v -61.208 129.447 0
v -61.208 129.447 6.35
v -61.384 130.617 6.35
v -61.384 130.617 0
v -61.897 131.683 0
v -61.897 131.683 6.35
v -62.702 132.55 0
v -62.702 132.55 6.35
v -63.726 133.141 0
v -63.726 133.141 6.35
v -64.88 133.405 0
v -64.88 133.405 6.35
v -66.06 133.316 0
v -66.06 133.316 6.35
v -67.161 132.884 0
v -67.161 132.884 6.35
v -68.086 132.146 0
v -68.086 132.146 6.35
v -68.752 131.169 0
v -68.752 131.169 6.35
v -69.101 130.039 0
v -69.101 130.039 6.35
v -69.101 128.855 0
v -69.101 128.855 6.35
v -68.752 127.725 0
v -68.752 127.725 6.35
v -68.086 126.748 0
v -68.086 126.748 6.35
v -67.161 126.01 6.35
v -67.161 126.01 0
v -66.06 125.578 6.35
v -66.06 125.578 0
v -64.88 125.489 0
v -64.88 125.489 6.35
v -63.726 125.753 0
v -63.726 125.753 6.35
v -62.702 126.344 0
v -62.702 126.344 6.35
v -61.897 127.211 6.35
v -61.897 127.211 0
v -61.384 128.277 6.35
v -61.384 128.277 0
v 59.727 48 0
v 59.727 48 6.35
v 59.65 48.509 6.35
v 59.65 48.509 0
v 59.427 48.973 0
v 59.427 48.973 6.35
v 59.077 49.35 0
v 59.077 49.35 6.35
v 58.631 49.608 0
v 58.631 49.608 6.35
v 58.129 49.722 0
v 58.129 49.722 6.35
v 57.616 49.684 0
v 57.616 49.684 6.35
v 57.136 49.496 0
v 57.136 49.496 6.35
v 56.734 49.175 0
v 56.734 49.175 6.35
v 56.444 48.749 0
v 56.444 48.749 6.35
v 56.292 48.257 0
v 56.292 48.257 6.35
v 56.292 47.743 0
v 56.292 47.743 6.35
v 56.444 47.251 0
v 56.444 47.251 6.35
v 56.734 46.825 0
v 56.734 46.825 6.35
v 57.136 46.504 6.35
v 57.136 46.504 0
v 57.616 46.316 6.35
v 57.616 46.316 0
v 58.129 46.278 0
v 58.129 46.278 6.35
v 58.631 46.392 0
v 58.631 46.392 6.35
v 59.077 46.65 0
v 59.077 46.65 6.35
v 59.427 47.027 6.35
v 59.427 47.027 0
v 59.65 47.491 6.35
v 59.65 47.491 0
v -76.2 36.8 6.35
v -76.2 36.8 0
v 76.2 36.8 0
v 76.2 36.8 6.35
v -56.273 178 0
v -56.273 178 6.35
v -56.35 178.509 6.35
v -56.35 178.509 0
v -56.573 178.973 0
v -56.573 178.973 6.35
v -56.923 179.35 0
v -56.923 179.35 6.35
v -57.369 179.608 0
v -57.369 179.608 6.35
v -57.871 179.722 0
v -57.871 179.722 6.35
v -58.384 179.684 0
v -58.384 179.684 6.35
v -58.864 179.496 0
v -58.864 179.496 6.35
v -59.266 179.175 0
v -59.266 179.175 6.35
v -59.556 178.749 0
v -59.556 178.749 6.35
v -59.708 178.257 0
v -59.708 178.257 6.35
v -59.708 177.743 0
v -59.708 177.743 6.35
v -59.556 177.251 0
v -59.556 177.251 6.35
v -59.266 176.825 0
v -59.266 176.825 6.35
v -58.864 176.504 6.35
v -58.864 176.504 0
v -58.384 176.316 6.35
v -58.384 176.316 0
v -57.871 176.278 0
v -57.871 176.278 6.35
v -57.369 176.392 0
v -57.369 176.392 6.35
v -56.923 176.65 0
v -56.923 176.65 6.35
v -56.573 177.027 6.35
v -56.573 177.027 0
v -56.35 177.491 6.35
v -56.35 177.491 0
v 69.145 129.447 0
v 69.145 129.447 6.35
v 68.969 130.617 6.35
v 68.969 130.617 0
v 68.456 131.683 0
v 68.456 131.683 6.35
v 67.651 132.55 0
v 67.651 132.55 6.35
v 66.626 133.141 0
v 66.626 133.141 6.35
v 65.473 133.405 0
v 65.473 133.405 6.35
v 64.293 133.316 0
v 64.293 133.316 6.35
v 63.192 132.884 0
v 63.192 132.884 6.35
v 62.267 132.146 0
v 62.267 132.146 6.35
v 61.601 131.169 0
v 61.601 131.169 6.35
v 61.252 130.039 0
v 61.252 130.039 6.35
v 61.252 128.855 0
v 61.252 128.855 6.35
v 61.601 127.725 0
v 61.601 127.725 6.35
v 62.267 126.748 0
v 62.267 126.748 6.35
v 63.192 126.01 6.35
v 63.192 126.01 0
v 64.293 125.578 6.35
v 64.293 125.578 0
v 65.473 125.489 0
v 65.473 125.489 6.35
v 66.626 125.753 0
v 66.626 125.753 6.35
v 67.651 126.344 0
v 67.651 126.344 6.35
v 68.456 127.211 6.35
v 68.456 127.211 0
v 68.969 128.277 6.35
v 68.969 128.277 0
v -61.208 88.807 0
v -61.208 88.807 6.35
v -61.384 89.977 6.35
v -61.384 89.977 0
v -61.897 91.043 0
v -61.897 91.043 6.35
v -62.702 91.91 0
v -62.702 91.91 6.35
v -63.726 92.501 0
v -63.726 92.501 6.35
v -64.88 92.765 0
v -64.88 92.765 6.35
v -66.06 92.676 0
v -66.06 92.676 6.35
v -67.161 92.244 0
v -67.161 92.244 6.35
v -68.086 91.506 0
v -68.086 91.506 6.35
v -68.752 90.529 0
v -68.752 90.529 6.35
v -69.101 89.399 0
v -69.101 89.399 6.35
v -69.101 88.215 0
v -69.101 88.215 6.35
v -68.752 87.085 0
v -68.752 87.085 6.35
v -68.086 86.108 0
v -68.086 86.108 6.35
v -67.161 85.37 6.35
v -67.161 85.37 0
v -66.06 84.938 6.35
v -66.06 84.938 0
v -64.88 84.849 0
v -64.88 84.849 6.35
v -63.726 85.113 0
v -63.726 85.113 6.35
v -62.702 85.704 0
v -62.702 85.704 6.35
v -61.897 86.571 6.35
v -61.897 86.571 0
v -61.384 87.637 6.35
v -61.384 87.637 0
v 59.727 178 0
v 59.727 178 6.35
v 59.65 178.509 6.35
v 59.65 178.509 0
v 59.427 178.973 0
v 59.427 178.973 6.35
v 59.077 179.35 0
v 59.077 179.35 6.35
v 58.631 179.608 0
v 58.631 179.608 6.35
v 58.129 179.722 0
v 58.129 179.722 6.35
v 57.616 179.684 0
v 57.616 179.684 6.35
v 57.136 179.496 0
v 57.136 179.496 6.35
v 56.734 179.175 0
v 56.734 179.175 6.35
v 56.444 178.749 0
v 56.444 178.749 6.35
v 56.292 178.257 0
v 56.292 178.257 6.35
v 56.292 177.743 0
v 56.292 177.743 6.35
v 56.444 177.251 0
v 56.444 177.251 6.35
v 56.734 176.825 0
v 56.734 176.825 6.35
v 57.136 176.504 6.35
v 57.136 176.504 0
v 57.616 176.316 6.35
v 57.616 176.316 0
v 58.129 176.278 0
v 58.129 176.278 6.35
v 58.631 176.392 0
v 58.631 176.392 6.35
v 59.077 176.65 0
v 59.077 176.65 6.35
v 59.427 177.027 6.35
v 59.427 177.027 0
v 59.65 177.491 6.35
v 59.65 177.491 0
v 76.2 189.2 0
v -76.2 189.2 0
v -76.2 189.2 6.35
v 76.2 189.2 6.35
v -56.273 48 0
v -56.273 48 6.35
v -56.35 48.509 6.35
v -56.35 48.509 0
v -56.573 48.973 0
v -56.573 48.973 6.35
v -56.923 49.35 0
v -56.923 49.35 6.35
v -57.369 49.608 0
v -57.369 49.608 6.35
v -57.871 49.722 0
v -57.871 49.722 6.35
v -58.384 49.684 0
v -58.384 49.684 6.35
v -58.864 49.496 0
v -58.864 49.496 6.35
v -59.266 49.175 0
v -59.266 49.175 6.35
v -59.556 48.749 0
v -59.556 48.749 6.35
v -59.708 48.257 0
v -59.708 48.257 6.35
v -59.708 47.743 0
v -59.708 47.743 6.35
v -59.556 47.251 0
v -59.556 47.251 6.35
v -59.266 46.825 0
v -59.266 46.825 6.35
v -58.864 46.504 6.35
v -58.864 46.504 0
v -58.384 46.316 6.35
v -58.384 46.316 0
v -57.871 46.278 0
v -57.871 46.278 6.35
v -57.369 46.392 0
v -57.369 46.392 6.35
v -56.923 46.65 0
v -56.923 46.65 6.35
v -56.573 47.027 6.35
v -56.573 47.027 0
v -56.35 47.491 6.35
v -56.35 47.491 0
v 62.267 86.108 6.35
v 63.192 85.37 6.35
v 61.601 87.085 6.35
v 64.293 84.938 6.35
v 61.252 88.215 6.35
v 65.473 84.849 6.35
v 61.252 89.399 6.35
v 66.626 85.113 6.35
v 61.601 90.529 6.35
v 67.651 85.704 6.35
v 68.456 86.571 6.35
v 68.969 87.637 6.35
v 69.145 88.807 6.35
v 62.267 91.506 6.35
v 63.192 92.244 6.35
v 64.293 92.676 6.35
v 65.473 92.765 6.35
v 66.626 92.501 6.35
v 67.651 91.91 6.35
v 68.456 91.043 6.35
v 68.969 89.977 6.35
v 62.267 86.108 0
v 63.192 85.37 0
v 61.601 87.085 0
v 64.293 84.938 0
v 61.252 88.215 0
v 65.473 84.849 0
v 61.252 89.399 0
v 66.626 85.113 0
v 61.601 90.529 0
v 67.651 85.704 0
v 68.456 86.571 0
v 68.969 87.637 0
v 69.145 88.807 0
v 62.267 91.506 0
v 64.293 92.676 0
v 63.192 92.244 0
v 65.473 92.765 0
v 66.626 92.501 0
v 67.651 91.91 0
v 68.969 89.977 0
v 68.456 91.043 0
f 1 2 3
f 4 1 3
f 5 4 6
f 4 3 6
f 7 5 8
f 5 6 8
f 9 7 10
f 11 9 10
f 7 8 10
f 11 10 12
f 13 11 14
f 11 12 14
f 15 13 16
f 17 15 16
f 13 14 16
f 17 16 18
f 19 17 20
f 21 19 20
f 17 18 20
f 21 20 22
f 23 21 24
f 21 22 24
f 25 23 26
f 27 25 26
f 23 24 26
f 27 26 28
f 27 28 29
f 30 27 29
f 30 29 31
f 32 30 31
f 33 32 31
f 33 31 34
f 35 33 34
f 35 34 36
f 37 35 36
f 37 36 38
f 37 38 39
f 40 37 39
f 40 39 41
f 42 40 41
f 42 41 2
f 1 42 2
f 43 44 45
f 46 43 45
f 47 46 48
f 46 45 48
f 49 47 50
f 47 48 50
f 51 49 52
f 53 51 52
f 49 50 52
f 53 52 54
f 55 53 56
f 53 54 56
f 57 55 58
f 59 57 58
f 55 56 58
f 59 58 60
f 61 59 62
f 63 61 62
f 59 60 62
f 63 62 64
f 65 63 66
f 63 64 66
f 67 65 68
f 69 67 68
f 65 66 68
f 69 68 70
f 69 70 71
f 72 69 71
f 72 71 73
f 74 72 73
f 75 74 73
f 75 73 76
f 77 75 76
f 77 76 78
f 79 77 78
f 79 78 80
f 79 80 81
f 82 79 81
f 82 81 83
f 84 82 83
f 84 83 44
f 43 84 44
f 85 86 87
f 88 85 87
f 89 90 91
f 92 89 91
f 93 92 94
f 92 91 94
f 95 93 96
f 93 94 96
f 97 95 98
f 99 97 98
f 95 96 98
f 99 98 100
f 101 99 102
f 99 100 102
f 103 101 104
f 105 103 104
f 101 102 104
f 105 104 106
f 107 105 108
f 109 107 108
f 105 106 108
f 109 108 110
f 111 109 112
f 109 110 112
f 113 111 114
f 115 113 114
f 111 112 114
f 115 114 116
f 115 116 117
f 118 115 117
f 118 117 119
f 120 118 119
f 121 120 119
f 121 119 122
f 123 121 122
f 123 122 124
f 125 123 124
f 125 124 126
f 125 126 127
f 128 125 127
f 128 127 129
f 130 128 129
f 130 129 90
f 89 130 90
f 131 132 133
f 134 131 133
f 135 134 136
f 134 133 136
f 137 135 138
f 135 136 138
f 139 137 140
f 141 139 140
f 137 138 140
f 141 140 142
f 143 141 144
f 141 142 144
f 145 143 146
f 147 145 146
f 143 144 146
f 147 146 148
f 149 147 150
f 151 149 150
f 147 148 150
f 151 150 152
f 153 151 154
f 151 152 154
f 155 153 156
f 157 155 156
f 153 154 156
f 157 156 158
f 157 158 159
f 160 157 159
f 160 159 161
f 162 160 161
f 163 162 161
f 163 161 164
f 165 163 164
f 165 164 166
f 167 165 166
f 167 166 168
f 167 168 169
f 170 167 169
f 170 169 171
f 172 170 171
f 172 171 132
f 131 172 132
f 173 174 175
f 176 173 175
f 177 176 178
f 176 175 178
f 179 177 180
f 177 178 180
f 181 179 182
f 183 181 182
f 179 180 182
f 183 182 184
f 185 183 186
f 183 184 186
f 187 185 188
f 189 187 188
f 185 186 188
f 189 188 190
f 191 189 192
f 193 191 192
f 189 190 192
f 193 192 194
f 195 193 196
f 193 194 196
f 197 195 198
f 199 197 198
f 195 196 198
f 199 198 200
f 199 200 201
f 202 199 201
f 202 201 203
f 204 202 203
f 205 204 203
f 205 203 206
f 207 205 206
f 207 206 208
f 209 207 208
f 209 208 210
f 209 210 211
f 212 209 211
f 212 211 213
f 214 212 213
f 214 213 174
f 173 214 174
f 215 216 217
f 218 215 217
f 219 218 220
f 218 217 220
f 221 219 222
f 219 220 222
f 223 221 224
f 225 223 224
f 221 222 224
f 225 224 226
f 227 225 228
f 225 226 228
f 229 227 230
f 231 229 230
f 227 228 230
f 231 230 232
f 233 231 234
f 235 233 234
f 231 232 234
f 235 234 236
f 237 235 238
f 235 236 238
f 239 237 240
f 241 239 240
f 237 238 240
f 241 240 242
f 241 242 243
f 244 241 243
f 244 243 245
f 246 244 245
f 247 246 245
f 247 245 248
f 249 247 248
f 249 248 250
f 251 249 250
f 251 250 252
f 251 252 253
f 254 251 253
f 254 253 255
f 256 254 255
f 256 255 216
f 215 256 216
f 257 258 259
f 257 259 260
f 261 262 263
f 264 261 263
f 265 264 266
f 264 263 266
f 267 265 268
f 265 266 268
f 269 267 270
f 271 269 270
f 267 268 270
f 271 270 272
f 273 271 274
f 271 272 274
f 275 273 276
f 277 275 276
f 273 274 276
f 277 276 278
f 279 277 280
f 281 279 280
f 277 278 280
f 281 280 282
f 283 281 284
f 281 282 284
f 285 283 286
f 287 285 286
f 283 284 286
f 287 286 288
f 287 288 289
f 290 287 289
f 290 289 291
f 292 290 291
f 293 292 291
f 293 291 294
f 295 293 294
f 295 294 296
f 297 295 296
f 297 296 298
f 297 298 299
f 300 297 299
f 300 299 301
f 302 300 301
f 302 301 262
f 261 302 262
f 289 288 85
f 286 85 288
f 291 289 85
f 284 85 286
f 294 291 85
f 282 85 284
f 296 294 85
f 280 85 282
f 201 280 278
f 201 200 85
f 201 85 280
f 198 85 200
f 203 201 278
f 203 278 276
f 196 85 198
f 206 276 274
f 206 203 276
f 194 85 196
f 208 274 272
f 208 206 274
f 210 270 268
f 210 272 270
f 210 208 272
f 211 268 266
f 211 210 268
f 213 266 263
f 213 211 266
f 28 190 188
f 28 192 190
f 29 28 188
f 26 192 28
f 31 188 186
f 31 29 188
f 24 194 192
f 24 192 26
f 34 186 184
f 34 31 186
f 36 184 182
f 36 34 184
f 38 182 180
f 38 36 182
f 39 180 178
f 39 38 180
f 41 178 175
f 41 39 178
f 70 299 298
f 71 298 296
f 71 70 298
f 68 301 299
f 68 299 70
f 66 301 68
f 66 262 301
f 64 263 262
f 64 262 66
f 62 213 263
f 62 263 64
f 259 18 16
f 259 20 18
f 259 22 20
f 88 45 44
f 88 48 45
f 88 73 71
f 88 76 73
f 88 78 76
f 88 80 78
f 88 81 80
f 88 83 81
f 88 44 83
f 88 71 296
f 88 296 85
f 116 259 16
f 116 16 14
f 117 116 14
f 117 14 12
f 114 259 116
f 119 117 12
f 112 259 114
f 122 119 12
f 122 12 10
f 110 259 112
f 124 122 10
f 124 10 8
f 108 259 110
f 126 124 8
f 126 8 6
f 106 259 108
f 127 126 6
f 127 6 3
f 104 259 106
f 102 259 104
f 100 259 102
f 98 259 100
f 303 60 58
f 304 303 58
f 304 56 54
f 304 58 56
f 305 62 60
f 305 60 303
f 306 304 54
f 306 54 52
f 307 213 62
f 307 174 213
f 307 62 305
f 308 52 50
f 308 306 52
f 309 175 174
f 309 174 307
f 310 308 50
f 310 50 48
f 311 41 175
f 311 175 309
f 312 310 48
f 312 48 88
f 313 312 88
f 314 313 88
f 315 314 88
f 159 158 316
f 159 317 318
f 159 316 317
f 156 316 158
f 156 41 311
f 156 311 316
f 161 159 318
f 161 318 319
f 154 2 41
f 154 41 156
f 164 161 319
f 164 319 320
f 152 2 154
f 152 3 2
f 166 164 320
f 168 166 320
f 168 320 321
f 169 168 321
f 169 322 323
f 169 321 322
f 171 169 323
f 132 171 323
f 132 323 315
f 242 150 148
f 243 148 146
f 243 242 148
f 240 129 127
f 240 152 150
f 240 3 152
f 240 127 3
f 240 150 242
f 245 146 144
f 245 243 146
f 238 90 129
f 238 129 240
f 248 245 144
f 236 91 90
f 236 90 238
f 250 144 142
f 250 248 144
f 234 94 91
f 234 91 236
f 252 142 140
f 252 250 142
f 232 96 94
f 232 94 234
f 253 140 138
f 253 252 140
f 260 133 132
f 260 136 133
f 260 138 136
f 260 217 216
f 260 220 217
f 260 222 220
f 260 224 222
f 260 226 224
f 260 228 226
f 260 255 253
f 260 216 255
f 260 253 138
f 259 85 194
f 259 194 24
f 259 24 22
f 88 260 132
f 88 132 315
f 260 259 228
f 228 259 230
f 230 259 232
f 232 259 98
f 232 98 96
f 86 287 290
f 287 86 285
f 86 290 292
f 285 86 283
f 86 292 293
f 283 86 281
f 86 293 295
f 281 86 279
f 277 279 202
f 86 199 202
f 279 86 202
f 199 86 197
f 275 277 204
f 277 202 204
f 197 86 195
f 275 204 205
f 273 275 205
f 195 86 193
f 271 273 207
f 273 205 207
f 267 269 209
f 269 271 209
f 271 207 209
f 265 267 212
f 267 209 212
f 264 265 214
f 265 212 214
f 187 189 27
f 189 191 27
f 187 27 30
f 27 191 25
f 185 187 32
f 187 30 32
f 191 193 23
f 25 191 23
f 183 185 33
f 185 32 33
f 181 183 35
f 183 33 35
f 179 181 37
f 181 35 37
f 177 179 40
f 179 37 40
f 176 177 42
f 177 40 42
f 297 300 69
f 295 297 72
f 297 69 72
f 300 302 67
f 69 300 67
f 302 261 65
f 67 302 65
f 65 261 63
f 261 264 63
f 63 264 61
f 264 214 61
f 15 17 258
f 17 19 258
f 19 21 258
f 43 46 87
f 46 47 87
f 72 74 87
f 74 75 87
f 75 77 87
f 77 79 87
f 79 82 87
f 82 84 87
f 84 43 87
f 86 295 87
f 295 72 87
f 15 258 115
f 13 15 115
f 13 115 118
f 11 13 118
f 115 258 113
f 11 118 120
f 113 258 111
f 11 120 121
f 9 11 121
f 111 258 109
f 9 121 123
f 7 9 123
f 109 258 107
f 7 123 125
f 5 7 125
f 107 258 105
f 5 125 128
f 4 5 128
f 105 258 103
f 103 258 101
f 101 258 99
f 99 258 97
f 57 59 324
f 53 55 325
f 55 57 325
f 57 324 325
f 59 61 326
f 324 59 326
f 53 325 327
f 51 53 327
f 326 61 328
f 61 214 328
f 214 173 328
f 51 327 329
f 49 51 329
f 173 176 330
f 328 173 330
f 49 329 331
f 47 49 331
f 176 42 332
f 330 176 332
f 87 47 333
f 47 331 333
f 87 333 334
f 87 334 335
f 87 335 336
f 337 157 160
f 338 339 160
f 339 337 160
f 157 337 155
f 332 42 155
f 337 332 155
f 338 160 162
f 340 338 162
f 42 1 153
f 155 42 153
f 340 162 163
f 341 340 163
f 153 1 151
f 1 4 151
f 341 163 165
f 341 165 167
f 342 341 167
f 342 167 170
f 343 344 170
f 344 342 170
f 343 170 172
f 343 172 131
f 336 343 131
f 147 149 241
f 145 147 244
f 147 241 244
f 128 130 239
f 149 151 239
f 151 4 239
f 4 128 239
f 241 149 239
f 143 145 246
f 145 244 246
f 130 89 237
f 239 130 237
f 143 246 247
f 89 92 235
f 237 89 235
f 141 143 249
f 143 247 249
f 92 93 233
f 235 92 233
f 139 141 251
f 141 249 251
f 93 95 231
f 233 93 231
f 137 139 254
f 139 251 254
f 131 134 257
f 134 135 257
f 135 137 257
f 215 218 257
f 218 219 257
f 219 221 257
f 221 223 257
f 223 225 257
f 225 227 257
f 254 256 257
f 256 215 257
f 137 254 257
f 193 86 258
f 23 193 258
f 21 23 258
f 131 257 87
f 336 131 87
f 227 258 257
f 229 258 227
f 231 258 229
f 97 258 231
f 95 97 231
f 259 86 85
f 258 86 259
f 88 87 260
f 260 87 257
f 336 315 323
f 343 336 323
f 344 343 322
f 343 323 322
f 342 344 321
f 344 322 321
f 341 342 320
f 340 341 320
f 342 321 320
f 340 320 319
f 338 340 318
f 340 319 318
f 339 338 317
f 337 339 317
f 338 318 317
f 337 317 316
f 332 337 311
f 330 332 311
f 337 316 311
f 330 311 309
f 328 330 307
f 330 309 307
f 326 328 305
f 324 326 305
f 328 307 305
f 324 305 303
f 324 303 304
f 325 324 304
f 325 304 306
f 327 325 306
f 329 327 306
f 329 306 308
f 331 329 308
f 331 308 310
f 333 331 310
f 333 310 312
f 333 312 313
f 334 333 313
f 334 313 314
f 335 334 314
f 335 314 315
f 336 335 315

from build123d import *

# Parameters (mm, degrees)
SKETCH1_W                          = 152.4
SKETCH1_H                          = 152.4
BOSS_EXTRUDE1_DEPTH                = 6.35
F_5_16_0_3125_DIAMETER_HOLE1_D     = 7.9375
F_5_16_0_3125_DIAMETER_HOLE1_DEPTH = 6.35
F_8_32_TAPPED_HOLE1_D              = 3.4544
F_8_32_TAPPED_HOLE1_DEPTH          = 6.35


with BuildPart() as part:
    # Sketch1 → Boss-Extrude1 (new body)
    with BuildSketch(Plane.XY):
        with Locations((0, 113)):
            Rectangle(SKETCH1_W, SKETCH1_H)
    extrude(amount=BOSS_EXTRUDE1_DEPTH)

    # 5/16 (0.3125) Diameter Hole1
    with Locations(Plane(origin=(0, 0, 0), x_dir=(-1, 0, 0), z_dir=(0, 0, -1))):
        with Locations((65.1764, 88.807), (65.1764, 129.447), (-65.1764, 129.447), (-65.1764, 88.807)):
            Hole(F_5_16_0_3125_DIAMETER_HOLE1_D / 2, depth=F_5_16_0_3125_DIAMETER_HOLE1_DEPTH)

    # #8-32 Tapped Hole1
    with Locations(Plane(origin=(0, 0, 0), x_dir=(-1, 0, 0), z_dir=(0, 0, -1))):
        with Locations((-58, 178), (58, 178), (58, 48), (-58, 48)):
            Hole(F_8_32_TAPPED_HOLE1_D / 2, depth=F_8_32_TAPPED_HOLE1_DEPTH)


solid = part.part
